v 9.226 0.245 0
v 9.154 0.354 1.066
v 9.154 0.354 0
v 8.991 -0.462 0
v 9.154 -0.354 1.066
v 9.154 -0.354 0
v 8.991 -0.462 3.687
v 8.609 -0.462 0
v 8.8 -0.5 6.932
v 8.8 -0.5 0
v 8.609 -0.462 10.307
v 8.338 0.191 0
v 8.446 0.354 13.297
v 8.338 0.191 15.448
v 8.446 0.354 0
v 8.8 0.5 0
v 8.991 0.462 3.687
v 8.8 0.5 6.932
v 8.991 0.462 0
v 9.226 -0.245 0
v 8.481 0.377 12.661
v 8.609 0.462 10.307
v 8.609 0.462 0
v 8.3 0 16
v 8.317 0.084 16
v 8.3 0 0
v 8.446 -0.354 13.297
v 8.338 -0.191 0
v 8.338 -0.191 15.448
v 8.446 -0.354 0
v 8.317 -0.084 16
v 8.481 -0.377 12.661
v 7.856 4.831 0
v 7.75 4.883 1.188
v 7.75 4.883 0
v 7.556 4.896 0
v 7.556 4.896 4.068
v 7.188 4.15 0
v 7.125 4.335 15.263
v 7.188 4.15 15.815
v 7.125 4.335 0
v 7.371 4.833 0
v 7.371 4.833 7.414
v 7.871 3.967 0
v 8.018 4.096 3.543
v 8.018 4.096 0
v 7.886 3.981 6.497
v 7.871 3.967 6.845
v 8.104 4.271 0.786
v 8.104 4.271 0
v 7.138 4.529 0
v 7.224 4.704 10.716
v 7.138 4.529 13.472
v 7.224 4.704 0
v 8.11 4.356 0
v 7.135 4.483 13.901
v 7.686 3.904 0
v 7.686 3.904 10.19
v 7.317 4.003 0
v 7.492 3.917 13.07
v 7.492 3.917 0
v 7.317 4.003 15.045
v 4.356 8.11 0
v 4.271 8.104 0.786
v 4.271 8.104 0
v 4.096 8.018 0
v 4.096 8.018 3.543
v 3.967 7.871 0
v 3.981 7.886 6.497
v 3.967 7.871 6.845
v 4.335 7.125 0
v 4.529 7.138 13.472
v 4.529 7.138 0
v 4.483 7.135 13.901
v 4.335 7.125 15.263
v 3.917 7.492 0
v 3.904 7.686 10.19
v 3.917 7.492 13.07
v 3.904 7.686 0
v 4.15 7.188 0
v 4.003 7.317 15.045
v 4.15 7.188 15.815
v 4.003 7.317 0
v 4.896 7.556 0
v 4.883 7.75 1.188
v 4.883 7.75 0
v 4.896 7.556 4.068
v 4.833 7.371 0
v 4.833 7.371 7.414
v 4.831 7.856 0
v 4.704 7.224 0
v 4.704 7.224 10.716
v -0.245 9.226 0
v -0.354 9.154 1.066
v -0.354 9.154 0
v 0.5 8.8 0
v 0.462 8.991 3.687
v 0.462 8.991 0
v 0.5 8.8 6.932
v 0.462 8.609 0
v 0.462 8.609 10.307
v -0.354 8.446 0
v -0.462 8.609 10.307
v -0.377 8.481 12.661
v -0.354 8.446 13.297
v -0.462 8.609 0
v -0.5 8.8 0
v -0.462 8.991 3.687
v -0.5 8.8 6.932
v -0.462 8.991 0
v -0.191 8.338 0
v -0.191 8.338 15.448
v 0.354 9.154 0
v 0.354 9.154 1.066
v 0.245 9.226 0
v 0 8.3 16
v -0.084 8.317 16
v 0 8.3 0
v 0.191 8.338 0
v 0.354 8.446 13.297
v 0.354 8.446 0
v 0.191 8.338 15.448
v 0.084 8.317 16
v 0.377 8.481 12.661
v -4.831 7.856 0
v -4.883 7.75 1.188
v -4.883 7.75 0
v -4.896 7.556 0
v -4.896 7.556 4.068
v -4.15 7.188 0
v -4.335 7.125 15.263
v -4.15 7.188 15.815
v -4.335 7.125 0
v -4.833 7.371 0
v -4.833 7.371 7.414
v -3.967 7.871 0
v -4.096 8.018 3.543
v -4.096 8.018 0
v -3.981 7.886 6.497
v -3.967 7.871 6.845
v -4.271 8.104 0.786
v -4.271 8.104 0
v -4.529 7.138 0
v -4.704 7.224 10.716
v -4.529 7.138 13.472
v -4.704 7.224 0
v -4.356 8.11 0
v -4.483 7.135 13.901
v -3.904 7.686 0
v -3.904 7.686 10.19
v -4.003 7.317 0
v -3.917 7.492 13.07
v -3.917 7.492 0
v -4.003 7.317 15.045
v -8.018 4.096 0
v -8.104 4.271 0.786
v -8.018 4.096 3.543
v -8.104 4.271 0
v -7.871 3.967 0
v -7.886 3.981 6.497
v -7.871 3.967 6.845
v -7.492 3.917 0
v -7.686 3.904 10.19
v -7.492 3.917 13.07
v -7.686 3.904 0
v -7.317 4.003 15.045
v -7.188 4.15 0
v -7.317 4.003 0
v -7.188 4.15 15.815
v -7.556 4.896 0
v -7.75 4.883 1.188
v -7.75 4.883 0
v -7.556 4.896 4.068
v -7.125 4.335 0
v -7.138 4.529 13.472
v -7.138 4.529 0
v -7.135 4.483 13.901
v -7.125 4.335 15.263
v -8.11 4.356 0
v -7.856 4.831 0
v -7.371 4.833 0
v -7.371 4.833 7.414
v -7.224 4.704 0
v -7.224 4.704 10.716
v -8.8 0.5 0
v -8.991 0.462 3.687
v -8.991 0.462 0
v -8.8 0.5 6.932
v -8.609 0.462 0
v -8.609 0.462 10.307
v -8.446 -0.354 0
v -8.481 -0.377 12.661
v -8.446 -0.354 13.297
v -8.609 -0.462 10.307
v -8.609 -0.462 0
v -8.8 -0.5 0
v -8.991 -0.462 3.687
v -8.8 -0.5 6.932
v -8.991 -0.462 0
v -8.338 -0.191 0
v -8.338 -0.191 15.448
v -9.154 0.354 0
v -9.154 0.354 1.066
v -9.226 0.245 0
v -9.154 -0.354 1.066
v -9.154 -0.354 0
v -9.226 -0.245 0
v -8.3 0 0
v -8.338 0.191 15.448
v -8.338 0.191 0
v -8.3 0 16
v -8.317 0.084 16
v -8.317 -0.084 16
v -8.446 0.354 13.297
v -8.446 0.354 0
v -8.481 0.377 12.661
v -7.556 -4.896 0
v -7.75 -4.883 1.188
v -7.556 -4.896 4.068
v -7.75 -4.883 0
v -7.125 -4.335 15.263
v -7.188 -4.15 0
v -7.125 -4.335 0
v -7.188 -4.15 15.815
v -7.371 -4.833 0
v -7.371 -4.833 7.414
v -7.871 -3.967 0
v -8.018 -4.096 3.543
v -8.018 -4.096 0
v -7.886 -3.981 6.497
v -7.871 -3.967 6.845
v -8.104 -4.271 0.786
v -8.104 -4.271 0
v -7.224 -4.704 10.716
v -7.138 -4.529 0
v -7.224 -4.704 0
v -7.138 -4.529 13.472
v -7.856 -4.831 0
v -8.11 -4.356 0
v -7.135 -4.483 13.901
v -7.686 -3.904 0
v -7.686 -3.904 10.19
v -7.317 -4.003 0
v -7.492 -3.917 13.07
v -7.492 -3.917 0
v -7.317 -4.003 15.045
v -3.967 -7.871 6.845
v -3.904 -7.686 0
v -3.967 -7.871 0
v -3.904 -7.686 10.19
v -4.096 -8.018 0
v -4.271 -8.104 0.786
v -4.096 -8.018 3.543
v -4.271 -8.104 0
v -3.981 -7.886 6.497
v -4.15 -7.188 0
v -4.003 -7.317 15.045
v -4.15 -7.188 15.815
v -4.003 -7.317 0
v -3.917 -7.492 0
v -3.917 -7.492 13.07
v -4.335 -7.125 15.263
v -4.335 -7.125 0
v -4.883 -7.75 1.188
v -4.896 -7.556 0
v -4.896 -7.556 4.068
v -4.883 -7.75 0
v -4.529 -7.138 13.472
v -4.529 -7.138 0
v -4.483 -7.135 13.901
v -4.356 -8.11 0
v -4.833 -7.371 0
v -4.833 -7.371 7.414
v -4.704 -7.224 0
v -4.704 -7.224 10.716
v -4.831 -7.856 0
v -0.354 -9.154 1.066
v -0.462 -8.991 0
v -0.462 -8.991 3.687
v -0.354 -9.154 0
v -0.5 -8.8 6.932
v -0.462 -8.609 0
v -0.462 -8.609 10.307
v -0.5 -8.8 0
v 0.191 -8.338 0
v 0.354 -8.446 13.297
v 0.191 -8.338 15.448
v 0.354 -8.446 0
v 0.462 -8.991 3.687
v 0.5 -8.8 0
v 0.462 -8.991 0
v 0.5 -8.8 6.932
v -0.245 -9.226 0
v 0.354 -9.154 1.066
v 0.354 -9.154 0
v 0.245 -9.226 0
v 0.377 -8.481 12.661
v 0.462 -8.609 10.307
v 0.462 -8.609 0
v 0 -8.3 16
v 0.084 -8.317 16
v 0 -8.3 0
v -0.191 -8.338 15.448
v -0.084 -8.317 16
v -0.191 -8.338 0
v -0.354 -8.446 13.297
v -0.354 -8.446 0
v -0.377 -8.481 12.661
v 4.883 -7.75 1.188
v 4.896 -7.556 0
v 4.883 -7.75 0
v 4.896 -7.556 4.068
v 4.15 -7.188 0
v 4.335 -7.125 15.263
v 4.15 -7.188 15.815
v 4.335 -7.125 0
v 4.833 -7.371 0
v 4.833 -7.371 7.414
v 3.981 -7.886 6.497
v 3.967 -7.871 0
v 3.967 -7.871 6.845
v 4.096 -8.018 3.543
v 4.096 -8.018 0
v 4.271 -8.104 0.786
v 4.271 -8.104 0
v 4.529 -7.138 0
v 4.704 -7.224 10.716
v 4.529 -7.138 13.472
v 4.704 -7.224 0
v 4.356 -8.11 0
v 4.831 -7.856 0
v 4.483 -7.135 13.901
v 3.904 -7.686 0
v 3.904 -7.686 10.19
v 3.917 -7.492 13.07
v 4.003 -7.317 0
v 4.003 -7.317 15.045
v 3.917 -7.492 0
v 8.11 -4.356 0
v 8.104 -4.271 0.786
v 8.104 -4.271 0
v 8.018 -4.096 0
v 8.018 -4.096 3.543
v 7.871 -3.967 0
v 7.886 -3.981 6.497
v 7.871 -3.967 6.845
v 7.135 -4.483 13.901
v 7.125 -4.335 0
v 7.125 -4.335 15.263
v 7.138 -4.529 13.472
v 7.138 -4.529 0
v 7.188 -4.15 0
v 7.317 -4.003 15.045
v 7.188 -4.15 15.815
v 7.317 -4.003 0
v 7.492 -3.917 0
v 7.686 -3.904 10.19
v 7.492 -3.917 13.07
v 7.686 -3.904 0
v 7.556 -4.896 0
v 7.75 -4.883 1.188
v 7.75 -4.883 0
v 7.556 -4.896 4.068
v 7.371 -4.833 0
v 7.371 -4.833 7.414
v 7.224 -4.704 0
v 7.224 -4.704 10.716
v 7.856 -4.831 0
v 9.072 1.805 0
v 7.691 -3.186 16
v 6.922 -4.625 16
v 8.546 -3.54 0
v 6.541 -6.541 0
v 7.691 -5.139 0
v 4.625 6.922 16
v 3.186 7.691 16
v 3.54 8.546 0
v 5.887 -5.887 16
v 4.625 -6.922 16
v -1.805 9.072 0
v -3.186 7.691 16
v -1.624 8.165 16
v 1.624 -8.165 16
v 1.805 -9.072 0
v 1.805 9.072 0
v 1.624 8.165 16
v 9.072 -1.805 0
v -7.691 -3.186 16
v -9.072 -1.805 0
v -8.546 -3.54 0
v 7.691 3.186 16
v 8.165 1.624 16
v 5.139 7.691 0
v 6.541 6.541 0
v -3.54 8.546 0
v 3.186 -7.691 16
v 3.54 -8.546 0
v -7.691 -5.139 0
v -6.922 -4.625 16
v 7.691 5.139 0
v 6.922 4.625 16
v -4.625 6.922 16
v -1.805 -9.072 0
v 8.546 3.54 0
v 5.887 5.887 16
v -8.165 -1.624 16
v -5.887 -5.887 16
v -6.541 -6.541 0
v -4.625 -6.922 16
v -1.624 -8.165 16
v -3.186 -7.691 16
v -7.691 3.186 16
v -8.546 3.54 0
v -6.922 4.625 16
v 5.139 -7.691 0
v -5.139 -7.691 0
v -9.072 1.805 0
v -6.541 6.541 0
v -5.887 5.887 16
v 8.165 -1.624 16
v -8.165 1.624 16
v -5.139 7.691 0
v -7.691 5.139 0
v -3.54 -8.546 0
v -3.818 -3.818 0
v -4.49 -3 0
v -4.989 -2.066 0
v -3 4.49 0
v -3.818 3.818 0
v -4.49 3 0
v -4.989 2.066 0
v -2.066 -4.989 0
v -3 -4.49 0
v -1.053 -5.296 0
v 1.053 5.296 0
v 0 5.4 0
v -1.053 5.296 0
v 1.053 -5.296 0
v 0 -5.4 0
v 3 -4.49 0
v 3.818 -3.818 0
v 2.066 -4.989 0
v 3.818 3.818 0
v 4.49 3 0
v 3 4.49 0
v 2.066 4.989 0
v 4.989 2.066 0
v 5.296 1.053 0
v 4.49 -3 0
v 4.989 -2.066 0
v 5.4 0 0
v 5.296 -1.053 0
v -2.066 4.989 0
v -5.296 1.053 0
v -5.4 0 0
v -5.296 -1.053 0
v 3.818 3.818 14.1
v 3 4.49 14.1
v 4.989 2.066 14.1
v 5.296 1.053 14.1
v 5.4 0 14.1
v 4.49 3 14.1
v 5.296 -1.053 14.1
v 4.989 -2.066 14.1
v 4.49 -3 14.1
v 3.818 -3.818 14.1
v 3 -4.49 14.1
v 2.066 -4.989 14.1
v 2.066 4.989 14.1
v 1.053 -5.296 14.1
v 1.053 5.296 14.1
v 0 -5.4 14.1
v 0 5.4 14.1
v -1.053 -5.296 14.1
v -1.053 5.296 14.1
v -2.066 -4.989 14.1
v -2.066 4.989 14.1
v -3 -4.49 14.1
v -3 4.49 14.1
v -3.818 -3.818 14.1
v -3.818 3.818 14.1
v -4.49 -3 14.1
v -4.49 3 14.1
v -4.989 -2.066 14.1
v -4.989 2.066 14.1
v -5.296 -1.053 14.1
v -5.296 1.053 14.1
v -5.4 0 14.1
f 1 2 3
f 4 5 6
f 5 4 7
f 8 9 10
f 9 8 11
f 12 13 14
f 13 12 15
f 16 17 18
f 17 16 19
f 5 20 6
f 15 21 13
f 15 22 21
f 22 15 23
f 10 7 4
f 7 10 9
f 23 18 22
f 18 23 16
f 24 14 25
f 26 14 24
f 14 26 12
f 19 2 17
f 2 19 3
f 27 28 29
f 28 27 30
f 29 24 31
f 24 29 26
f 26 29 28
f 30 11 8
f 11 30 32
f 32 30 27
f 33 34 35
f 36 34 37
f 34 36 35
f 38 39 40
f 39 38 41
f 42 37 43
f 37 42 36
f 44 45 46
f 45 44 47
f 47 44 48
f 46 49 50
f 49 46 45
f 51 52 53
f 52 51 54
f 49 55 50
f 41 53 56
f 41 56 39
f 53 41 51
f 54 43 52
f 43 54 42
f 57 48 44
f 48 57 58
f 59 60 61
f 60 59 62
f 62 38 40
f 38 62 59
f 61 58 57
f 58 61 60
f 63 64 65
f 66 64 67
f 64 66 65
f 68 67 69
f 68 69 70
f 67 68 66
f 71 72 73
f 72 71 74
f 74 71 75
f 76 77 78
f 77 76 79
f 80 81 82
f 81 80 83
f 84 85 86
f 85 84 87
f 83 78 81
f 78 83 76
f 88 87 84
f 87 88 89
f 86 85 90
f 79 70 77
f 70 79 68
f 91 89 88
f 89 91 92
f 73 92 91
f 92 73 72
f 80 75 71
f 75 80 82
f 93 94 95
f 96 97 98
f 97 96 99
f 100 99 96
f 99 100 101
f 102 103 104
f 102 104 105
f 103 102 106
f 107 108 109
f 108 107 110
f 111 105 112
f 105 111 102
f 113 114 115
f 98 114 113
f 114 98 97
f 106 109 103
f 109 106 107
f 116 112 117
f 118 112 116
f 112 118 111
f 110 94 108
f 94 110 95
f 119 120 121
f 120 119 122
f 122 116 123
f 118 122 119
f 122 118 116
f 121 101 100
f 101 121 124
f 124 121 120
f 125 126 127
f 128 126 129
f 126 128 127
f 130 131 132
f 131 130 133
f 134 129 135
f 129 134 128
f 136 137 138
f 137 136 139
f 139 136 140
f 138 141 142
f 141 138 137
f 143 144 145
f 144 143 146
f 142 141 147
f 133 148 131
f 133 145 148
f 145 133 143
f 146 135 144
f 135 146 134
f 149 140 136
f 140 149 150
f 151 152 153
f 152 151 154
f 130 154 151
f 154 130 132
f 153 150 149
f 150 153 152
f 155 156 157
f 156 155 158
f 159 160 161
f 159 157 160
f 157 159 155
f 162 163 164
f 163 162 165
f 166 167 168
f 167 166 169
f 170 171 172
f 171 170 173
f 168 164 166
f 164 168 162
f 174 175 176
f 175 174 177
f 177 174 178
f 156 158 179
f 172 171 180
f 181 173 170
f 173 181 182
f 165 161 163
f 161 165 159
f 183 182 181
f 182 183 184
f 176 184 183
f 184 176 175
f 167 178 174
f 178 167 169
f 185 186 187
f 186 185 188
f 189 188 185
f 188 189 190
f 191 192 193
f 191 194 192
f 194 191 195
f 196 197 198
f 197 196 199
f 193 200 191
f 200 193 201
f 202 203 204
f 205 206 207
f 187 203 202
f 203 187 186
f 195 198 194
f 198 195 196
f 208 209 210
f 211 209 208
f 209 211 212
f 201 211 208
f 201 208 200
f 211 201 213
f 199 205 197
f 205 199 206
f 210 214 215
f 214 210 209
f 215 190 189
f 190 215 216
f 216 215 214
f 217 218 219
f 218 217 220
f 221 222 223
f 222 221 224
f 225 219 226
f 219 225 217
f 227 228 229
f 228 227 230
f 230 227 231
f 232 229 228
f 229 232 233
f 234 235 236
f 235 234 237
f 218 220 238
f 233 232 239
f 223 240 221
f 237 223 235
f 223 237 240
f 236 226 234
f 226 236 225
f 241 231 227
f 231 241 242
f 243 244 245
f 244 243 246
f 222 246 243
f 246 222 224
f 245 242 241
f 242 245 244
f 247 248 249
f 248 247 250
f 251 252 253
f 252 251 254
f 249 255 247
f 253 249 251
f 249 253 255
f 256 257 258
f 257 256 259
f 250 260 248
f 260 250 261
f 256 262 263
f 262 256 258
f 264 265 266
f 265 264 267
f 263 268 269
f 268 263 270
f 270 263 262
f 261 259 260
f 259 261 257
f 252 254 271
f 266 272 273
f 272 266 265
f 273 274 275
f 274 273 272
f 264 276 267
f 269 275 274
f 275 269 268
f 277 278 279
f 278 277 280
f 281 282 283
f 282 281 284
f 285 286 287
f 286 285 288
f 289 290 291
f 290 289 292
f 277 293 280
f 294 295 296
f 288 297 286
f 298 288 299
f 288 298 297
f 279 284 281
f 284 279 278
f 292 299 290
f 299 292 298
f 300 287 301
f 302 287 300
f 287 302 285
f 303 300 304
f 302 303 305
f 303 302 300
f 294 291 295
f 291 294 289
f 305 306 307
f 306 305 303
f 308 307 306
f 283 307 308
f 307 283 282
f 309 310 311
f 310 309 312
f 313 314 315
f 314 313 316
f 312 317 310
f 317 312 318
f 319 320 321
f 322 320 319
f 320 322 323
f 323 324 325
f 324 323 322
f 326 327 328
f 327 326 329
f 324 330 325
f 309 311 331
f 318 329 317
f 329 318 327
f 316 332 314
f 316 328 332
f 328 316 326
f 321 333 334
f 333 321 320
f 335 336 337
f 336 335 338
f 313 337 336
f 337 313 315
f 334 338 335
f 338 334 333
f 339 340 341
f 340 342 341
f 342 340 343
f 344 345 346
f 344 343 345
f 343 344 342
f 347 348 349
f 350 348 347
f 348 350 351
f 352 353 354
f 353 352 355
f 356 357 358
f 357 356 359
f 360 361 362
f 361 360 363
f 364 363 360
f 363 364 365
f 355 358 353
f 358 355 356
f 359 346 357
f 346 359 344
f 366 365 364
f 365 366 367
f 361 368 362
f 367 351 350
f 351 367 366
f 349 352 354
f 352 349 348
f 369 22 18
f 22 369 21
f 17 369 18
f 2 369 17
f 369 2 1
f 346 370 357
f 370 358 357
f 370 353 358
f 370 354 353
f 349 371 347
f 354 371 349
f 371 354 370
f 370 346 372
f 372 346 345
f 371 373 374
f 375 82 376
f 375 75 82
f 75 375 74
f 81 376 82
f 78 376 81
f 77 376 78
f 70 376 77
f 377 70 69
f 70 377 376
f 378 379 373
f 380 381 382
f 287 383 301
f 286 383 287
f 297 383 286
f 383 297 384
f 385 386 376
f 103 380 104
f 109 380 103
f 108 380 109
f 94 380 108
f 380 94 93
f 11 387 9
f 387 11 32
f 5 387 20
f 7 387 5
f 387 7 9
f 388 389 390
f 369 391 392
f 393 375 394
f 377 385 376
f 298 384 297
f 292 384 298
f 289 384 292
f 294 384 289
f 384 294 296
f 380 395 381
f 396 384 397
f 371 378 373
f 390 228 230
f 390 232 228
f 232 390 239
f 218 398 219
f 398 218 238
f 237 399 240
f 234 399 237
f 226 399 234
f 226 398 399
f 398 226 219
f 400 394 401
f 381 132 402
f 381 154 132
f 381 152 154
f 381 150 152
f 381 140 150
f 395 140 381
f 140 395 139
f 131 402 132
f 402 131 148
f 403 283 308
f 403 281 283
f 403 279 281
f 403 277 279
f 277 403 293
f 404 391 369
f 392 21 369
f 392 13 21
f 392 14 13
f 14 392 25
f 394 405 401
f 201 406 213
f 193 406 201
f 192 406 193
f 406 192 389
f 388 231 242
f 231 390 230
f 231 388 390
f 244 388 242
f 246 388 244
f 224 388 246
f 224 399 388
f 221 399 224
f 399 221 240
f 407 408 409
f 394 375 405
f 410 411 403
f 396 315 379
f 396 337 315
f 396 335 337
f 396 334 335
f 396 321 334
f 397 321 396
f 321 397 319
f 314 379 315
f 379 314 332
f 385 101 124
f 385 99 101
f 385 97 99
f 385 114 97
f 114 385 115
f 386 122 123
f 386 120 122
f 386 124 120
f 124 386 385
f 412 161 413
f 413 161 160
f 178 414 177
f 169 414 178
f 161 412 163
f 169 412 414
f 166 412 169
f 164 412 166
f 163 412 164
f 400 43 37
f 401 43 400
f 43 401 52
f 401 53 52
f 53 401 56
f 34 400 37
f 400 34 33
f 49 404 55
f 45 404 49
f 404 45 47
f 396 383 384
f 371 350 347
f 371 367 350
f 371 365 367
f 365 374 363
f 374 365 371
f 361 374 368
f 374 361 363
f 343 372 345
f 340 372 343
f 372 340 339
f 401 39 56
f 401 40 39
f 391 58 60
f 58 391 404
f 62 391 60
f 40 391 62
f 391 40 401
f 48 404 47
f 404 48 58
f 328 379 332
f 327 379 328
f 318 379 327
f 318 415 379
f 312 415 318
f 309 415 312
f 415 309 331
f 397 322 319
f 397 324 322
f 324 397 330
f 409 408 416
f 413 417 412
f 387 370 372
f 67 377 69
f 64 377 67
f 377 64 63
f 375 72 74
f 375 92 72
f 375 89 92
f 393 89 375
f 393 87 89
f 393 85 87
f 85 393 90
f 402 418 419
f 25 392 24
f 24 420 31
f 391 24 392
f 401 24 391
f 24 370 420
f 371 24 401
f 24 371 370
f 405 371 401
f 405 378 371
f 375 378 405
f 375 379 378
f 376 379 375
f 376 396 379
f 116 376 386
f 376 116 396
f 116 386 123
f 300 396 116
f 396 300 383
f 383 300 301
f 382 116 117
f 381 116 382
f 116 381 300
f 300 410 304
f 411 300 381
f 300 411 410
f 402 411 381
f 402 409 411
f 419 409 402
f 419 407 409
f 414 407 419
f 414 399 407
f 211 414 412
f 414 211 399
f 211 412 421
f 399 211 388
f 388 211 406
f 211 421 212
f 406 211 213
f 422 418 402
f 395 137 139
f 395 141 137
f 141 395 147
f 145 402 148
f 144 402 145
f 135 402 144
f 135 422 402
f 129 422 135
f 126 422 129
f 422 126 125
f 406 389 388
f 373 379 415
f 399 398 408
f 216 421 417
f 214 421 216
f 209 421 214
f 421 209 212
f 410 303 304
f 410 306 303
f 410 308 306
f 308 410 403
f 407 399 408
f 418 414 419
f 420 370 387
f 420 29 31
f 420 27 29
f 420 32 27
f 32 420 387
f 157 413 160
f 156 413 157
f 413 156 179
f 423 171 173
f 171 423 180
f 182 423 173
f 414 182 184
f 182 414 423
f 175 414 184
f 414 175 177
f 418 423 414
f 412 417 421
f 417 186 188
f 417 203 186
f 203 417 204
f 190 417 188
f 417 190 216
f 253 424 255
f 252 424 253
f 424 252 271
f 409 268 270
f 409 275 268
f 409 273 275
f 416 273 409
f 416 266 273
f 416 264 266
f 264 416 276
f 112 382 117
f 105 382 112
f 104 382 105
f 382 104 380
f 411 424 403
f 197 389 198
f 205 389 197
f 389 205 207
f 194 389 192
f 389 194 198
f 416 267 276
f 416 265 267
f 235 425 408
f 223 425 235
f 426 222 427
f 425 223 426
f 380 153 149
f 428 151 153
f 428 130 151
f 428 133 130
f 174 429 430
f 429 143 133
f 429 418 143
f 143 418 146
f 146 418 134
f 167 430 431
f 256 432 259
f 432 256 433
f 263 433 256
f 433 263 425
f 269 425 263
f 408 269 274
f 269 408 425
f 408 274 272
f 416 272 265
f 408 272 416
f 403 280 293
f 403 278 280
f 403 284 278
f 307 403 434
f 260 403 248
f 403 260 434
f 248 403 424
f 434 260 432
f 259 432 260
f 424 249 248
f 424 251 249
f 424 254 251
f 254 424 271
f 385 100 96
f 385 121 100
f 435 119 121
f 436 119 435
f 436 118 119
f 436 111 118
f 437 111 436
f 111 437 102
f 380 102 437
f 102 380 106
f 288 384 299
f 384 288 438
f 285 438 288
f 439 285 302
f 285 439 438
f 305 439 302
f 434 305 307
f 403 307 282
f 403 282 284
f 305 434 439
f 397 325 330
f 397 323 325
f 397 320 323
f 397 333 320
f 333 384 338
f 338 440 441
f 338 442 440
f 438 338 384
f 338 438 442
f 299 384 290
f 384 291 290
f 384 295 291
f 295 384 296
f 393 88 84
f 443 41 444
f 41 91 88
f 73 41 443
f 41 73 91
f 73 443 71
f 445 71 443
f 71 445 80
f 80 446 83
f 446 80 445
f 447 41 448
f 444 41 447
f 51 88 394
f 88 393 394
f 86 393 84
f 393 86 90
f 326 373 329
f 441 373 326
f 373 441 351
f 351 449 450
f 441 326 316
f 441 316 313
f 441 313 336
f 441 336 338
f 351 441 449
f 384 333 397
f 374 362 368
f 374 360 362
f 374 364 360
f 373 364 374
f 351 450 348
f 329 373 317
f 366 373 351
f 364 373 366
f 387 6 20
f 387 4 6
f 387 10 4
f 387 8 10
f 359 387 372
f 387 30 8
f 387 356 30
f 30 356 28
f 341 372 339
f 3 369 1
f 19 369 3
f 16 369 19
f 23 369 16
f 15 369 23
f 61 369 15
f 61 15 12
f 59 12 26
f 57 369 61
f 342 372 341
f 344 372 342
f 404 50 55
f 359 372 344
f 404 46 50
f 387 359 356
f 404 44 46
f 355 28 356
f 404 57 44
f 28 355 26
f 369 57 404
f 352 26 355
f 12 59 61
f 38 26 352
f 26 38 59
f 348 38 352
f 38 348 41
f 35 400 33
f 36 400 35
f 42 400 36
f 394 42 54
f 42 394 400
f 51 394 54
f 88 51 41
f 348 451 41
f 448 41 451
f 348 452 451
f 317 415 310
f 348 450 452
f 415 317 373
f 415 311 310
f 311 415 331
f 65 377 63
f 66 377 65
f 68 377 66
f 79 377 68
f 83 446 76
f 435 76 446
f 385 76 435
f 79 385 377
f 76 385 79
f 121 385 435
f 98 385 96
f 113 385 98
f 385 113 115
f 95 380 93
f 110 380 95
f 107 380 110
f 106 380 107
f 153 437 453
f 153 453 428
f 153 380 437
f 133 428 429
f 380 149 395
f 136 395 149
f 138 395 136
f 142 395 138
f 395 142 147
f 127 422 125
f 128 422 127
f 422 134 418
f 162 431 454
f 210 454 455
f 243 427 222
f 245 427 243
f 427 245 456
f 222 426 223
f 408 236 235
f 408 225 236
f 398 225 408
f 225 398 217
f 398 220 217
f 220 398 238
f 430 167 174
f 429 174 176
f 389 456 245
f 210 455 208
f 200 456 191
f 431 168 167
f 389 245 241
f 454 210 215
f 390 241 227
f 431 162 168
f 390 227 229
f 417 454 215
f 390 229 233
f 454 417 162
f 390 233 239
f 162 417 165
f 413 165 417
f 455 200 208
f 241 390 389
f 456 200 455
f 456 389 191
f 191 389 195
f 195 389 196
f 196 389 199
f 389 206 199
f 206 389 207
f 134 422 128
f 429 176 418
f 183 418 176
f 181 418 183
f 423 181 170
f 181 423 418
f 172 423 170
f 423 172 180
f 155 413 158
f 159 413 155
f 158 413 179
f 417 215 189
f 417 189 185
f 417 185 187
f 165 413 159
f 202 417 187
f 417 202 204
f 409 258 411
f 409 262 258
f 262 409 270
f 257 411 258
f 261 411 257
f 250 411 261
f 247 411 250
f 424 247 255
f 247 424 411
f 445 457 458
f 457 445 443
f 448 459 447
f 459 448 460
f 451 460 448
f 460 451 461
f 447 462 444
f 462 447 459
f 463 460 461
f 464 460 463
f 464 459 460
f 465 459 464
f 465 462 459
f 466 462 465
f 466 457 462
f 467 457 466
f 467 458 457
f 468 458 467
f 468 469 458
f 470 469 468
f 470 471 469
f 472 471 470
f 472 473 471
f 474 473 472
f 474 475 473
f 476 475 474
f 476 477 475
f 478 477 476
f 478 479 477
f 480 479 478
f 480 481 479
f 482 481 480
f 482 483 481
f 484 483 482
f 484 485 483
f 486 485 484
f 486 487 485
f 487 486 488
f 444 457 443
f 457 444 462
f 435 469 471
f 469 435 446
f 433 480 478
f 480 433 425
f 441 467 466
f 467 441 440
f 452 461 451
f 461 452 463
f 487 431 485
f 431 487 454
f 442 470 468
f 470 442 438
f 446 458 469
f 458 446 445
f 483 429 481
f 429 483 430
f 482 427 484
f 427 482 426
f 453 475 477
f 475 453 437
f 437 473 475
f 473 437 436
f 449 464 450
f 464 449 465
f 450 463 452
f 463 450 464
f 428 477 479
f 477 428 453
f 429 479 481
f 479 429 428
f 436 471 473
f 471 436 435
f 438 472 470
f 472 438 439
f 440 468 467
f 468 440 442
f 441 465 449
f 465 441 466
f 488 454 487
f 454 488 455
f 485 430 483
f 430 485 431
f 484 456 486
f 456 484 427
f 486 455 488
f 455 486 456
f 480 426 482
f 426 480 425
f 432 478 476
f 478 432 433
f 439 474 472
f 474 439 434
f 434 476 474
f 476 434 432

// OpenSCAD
// ACCESS KNOB — Make Noise Eurorack Module Knob (Slip-On Sleeve)
// Generated via CLI for Studio Knobs (Slip-On Sleeve)
module access_knob_makenoise_euro_slipon() {
  outer_d = 18.5;
  height = 16;
  taper = 0.9;
  bore_d = 10.5;
  slot_h = 14;
  tex_depth = 0.9;
  tex_scale = 1;
  tex_count = 12;

  difference() {
    cylinder(h=height, d1=outer_d, d2=outer_d*taper, $fn=32);
    translate([0,0,-0.1]) cylinder(h=slot_h+0.2, d=bore_d + 0.3, $fn=32);
    for(i=[0:tex_count-1]) {
      rotate([0,0,i*(360/tex_count)])
        translate([outer_d/2-tex_depth/2, 0, height/2])
          cylinder(h=height*1.1, d=tex_scale, center=true, $fn=16);
    }
  }
}
access_knob_makenoise_euro_slipon();
